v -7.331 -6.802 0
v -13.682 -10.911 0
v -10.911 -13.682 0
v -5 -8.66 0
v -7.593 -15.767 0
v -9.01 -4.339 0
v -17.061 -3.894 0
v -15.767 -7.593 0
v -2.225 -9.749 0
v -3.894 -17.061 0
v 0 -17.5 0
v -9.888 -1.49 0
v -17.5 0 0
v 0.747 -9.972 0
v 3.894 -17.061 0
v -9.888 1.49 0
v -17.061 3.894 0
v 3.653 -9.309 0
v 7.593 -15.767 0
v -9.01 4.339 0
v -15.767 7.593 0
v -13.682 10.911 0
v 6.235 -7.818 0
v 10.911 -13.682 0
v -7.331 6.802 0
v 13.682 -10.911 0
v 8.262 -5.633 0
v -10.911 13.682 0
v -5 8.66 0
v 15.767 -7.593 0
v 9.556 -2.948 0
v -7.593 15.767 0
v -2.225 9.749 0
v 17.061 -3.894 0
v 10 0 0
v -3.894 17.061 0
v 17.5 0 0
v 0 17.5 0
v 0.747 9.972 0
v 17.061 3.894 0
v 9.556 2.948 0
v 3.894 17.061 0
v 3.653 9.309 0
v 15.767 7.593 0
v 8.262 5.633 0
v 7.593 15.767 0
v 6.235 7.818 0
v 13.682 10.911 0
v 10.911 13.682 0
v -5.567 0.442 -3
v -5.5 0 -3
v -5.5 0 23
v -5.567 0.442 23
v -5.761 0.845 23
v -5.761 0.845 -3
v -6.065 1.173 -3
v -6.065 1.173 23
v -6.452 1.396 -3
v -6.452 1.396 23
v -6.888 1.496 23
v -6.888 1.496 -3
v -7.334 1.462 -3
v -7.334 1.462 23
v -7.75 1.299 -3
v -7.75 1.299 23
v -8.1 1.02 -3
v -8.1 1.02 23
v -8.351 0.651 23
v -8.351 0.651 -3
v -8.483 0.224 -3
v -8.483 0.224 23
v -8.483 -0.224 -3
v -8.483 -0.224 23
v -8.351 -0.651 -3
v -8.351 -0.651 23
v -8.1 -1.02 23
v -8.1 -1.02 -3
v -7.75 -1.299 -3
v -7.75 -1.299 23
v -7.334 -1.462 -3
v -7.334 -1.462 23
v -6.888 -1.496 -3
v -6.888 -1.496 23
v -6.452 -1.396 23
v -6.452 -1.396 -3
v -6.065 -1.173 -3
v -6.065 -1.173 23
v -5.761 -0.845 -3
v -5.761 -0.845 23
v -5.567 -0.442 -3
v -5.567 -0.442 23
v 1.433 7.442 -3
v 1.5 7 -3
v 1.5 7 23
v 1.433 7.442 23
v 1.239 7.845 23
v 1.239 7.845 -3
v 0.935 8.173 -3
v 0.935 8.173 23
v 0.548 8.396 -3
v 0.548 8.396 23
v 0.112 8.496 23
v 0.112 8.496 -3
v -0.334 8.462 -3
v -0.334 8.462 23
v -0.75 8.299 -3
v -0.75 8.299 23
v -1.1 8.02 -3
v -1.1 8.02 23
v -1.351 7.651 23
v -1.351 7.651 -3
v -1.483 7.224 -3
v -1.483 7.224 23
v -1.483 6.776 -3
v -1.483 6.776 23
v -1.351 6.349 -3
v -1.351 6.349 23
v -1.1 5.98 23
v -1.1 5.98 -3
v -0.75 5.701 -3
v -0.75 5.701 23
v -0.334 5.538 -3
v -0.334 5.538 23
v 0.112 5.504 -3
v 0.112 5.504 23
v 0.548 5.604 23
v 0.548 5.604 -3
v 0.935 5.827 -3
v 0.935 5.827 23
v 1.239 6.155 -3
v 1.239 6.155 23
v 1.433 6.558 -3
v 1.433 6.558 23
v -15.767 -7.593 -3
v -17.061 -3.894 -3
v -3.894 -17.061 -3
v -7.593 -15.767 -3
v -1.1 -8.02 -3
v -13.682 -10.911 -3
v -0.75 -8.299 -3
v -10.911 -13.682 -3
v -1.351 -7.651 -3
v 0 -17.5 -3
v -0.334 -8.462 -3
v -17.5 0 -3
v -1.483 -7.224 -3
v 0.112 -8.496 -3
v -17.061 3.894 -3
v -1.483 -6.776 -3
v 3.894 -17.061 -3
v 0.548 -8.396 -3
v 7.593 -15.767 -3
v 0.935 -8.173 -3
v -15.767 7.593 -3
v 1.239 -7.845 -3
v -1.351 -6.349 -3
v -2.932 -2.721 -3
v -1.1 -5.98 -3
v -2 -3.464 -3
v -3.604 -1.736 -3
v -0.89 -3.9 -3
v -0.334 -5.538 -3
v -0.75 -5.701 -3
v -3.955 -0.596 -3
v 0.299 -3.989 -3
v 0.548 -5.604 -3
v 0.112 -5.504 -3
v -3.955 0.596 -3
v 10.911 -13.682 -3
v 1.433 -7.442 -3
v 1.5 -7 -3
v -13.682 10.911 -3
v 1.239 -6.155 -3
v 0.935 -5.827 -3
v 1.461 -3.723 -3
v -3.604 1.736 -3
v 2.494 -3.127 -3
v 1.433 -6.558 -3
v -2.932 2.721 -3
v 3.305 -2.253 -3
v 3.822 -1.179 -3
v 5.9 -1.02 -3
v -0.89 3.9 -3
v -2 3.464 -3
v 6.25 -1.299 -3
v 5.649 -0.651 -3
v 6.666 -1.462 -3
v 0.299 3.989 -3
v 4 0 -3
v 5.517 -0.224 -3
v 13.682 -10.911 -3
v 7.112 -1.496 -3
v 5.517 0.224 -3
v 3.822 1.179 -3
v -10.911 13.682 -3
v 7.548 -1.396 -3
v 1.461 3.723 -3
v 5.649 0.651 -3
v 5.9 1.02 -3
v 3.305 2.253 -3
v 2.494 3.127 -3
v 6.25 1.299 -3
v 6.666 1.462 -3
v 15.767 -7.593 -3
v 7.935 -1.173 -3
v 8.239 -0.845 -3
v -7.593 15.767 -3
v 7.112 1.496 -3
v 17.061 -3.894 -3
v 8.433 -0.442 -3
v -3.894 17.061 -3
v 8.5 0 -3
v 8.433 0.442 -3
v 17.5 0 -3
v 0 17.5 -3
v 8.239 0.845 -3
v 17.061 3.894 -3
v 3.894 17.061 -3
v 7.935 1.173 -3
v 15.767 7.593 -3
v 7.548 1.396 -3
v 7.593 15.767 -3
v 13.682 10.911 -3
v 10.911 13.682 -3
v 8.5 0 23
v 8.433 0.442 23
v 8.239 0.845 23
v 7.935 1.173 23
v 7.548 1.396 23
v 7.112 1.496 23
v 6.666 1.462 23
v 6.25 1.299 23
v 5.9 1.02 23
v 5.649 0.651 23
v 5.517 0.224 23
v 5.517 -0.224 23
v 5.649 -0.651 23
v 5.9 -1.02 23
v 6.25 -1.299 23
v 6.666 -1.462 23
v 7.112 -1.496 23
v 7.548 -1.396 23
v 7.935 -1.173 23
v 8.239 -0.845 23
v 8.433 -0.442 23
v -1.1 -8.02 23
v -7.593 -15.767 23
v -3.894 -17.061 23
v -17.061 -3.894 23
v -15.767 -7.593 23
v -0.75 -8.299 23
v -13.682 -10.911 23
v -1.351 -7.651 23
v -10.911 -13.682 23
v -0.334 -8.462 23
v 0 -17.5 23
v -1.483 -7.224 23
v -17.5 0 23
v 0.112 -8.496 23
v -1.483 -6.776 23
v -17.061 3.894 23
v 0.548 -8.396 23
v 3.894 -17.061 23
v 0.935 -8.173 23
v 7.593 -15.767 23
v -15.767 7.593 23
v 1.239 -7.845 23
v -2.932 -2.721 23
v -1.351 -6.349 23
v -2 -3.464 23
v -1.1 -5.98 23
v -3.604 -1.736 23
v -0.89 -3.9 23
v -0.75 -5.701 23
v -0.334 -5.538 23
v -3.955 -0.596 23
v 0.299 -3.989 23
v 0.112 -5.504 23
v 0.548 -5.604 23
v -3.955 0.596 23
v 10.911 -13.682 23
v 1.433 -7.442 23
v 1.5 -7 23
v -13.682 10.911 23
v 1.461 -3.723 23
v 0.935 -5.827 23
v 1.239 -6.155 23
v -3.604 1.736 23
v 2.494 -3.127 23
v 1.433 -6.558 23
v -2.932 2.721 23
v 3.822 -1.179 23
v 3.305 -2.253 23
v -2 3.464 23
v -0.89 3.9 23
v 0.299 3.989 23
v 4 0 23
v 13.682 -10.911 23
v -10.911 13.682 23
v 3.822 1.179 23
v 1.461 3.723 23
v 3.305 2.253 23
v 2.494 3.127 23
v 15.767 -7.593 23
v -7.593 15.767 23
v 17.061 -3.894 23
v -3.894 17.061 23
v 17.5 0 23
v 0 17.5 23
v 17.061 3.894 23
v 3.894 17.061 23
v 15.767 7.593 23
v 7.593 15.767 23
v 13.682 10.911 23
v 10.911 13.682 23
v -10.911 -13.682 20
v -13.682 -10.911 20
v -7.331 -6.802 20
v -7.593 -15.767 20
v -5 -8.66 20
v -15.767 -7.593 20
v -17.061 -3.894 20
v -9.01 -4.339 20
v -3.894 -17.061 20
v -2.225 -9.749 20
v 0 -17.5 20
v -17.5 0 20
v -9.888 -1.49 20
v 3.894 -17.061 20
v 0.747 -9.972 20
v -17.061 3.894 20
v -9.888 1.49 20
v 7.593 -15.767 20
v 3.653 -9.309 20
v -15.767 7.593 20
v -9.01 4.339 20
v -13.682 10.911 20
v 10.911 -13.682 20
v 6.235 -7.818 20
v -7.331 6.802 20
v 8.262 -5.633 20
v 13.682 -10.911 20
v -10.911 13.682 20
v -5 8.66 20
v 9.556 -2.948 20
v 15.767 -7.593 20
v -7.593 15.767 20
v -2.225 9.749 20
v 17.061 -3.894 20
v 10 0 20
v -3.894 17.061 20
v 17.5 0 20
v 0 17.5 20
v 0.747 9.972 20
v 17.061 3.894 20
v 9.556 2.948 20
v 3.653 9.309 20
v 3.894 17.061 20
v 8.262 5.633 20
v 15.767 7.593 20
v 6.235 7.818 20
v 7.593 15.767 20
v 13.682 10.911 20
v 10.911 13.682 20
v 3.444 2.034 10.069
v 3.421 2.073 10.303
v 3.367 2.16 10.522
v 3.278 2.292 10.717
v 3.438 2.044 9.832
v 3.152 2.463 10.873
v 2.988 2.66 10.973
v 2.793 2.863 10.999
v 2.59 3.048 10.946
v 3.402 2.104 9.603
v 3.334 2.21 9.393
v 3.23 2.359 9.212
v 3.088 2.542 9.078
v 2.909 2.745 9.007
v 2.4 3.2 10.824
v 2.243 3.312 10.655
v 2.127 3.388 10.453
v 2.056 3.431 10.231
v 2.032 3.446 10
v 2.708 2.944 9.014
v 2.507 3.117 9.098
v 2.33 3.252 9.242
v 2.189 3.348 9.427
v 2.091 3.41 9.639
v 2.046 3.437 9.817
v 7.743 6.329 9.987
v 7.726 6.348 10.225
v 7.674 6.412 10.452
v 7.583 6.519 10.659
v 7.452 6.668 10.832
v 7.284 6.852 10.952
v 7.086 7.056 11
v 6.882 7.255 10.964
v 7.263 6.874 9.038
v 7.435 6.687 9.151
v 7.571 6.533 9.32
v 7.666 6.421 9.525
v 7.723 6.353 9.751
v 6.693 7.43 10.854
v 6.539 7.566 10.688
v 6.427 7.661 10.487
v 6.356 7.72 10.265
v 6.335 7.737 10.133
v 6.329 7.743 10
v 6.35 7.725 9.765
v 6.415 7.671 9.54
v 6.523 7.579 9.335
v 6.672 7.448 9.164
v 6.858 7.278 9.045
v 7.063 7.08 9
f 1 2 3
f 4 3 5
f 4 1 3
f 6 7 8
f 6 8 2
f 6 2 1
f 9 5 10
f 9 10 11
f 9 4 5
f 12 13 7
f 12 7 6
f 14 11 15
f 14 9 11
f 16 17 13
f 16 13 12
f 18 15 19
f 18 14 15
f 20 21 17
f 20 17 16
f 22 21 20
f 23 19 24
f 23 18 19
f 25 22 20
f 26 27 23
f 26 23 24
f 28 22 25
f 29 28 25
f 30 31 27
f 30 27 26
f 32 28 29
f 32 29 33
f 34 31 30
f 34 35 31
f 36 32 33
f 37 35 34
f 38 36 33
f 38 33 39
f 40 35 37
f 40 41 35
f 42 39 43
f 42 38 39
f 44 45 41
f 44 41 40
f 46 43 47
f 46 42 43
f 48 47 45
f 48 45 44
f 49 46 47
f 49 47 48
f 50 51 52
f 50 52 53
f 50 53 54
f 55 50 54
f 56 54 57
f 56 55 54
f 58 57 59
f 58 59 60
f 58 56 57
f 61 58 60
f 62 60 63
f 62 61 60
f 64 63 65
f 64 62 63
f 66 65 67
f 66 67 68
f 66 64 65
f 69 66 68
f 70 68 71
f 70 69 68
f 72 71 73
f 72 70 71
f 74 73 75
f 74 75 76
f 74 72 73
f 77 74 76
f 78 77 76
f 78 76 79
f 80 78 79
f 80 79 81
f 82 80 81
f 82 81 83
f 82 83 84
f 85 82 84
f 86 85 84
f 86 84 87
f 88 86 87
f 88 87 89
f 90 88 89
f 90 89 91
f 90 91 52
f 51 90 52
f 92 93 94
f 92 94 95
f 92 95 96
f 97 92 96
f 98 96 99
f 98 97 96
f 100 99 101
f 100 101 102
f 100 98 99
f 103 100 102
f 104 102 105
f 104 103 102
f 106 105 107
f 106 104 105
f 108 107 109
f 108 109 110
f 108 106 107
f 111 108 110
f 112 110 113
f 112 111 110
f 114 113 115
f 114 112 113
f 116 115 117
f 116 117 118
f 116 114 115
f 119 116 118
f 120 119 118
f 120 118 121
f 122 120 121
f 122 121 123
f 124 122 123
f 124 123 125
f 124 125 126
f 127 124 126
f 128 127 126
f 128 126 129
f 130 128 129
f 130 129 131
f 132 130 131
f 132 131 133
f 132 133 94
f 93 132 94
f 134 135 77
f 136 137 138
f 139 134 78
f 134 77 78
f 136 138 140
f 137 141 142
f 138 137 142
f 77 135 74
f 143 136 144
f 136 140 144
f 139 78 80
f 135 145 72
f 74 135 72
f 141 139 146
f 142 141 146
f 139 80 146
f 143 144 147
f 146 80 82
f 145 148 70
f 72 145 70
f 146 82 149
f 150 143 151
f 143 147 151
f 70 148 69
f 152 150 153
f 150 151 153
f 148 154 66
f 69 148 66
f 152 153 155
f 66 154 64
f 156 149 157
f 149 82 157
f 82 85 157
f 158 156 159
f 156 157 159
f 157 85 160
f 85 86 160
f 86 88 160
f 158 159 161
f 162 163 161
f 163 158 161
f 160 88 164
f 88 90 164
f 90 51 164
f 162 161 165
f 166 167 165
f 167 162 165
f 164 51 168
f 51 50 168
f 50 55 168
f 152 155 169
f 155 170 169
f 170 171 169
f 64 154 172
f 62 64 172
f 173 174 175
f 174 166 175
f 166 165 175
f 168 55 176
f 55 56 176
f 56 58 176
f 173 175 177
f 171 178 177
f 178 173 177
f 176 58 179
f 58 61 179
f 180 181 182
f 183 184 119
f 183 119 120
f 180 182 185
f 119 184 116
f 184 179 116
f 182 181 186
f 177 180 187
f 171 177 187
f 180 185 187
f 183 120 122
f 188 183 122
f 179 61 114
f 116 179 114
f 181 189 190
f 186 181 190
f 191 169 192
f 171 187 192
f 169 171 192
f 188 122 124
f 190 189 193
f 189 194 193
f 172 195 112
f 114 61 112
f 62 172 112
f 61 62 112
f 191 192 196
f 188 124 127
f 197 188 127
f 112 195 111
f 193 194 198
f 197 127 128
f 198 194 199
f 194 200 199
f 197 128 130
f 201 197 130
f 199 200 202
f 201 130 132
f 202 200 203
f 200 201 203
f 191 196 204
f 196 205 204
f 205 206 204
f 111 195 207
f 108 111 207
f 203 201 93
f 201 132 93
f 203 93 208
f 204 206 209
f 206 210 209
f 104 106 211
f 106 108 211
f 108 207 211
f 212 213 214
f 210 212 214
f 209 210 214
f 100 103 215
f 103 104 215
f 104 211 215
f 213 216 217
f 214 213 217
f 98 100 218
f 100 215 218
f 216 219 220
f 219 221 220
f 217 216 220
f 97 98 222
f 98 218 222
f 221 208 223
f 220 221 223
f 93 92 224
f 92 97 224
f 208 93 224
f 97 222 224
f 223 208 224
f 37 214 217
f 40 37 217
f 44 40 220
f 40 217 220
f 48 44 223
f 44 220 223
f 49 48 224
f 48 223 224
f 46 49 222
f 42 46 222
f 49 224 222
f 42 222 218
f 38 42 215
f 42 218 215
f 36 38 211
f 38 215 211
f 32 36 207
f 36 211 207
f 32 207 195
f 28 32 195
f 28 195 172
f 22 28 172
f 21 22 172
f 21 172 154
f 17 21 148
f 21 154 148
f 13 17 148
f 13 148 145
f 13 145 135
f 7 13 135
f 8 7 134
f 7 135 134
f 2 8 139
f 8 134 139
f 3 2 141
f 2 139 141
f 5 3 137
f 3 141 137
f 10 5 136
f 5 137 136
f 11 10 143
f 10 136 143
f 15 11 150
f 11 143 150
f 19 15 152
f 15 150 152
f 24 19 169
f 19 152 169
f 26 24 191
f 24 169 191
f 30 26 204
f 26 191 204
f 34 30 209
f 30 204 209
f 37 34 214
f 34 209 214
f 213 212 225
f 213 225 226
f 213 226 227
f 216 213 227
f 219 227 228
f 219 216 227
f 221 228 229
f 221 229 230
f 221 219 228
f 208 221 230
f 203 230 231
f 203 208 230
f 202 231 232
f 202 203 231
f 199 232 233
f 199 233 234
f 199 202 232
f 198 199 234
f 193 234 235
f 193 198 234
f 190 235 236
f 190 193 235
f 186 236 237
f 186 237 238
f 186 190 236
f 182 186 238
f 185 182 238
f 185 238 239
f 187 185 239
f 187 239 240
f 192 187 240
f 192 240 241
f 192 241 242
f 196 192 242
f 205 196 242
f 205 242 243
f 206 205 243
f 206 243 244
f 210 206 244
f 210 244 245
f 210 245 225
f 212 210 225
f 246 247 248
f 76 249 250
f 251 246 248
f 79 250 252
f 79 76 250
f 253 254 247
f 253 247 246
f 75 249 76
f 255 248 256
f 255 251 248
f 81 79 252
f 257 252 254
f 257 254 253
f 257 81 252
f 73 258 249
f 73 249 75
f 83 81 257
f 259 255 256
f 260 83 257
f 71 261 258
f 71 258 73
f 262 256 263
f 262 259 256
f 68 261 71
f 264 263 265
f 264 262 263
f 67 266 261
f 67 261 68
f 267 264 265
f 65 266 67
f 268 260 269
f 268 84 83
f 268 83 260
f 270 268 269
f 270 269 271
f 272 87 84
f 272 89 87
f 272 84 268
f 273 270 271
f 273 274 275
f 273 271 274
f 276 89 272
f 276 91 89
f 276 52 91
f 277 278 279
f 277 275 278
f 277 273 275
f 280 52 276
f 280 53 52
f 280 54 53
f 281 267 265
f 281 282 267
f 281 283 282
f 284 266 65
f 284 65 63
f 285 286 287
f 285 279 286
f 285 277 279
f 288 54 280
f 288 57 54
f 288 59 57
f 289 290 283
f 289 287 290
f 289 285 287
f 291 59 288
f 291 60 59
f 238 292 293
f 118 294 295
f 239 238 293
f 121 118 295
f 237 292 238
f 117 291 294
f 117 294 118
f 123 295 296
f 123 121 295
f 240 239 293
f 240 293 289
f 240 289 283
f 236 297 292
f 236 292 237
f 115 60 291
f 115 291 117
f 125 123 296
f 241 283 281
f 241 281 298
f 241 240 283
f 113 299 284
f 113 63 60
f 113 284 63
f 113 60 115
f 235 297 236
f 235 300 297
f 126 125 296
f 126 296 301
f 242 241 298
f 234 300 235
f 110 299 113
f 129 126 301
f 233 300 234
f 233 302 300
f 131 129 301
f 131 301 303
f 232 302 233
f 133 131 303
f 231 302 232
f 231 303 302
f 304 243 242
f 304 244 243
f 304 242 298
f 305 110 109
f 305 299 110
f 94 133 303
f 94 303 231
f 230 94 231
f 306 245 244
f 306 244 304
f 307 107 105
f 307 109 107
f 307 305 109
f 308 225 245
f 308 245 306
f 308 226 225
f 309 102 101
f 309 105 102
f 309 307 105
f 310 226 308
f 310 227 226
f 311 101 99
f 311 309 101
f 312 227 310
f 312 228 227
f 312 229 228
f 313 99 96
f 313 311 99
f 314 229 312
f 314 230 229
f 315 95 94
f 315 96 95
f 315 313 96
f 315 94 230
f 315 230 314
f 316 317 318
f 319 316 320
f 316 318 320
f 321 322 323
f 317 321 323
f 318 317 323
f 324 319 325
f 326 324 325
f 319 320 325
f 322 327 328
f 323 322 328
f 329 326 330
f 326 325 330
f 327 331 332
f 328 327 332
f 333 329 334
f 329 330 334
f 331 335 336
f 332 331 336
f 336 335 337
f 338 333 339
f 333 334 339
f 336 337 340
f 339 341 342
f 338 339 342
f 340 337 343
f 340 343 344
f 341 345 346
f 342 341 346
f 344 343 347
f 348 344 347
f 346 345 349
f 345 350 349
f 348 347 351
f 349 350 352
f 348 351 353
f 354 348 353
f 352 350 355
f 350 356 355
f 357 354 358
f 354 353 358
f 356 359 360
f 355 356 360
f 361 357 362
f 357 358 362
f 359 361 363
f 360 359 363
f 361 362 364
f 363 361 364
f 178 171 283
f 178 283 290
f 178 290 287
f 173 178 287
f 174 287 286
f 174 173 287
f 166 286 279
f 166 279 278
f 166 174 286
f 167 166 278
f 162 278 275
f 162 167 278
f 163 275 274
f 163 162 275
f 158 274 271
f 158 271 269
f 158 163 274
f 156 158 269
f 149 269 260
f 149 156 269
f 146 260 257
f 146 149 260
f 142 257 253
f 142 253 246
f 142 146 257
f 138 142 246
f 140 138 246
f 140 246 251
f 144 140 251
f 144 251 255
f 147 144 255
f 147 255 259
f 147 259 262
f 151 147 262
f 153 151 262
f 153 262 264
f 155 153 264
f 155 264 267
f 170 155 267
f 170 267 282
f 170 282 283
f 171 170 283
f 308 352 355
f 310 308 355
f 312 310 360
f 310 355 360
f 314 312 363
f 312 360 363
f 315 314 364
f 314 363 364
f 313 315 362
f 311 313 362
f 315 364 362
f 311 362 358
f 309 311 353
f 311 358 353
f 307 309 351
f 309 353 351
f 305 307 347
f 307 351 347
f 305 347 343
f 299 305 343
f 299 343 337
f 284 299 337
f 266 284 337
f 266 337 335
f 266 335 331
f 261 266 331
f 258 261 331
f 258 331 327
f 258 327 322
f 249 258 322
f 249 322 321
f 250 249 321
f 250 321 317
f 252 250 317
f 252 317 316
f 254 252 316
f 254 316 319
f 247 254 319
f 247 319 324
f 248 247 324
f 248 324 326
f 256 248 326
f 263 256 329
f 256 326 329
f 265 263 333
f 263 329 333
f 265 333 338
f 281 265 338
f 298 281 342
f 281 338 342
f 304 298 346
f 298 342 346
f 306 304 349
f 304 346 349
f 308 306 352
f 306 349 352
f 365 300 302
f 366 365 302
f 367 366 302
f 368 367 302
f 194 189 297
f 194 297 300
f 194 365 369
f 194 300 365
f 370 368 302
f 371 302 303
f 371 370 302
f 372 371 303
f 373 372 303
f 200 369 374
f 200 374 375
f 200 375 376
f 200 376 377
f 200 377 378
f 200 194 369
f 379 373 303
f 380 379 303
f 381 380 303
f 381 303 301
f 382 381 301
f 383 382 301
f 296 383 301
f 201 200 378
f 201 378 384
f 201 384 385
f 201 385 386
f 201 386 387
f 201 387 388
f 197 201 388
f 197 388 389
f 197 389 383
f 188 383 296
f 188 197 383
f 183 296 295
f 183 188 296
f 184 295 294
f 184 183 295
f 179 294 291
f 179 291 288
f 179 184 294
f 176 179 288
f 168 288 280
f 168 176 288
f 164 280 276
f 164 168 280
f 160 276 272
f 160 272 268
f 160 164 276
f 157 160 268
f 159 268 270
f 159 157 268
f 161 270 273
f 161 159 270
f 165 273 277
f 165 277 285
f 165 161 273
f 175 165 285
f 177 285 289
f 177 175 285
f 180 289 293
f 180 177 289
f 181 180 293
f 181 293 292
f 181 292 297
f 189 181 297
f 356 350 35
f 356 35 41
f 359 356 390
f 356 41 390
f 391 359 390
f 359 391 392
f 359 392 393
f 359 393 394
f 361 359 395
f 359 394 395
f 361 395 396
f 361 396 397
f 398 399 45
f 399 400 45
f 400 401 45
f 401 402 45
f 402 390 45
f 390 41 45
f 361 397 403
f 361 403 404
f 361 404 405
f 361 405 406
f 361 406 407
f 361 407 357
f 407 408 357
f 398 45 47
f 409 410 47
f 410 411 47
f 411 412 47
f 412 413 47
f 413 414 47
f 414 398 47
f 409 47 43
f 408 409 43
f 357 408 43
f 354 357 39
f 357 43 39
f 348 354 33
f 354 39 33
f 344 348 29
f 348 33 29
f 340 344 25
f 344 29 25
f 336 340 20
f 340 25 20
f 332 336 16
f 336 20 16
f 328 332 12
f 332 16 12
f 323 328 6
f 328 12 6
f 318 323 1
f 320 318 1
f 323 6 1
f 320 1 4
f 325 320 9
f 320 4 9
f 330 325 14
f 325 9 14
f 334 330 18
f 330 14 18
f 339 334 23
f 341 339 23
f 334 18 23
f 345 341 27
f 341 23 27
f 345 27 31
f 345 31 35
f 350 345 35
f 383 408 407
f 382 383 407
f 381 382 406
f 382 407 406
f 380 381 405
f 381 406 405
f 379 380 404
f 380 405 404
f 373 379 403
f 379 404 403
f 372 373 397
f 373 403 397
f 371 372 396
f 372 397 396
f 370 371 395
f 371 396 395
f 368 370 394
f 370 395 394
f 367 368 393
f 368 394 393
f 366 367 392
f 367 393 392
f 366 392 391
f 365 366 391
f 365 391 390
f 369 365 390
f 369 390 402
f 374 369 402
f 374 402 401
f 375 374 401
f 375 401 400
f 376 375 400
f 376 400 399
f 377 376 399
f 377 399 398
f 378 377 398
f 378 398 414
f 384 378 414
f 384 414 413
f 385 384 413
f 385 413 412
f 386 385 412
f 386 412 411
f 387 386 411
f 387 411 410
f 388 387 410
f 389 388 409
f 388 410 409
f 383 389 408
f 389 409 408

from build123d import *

# Parameters (mm, degrees)
SKETCH_1_R          = 17.5
SKETCH_1_R_2        = 1.5
SKETCH_1_R_3        = 4
EXTRUDE_1_DEPTH     = 23
SKETCH_1_4_R        = 17.5
SKETCH_1_4_R_2      = 10
CUT_EXTRUDE_1_DEPTH = 20
EXTRUDE_START       = -3
SKETCH_1_5_R        = 17.5
SKETCH_1_5_R_2      = 1.5
SKETCH_1_5_R_3      = 4
EXTRUDE_3_DEPTH     = 3
SKETCH_3_R          = 1
CUT_EXTRUDE_2_DEPTH = 9


with BuildPart() as part:
    # 草图1 → 凸台-拉伸1 (new body)
    with BuildSketch(Plane.XY):
        Circle(SKETCH_1_R)
        with Locations((0, 7)):
            Circle(SKETCH_1_R_2, mode=Mode.SUBTRACT)
        with Locations((0, -7)):
            Circle(SKETCH_1_R_2, mode=Mode.SUBTRACT)
        with Locations((7, 0)):
            Circle(SKETCH_1_R_2, mode=Mode.SUBTRACT)
        with Locations((-7, 0)):
            Circle(SKETCH_1_R_2, mode=Mode.SUBTRACT)
        Circle(SKETCH_1_R_3, mode=Mode.SUBTRACT)
    extrude(amount=EXTRUDE_1_DEPTH)

    # 草图1<4> → 切除-拉伸1 (cut)
    with BuildSketch(Plane.XY):
        Circle(SKETCH_1_4_R)
        Circle(SKETCH_1_4_R_2, mode=Mode.SUBTRACT)
    extrude(amount=CUT_EXTRUDE_1_DEPTH, mode=Mode.SUBTRACT)

    # 草图1<5> → 凸台-拉伸3 (add)
    with BuildSketch(Plane.XY.offset(EXTRUDE_START)):
        Circle(SKETCH_1_5_R)
        with Locations((0, 7)):
            Circle(SKETCH_1_5_R_2, mode=Mode.SUBTRACT)
        with Locations((0, -7)):
            Circle(SKETCH_1_5_R_2, mode=Mode.SUBTRACT)
        with Locations((7, 0)):
            Circle(SKETCH_1_5_R_2, mode=Mode.SUBTRACT)
        with Locations((-7, 0)):
            Circle(SKETCH_1_5_R_2, mode=Mode.SUBTRACT)
        Circle(SKETCH_1_5_R_3, mode=Mode.SUBTRACT)
    extrude(amount=EXTRUDE_3_DEPTH)

    # 草图3 → 切除-拉伸2 (cut)
    with BuildSketch(Plane(origin=(7.071067812, 7.071067812, 0), x_dir=(0.7071067811865488, -0.7071067811865462, 0), z_dir=(0.7071067811865462, 0.7071067811865488, 0))):
        with Locations((0, -10)):
            Circle(SKETCH_3_R)
    extrude(amount=-CUT_EXTRUDE_2_DEPTH, mode=Mode.SUBTRACT)


solid = part.part
